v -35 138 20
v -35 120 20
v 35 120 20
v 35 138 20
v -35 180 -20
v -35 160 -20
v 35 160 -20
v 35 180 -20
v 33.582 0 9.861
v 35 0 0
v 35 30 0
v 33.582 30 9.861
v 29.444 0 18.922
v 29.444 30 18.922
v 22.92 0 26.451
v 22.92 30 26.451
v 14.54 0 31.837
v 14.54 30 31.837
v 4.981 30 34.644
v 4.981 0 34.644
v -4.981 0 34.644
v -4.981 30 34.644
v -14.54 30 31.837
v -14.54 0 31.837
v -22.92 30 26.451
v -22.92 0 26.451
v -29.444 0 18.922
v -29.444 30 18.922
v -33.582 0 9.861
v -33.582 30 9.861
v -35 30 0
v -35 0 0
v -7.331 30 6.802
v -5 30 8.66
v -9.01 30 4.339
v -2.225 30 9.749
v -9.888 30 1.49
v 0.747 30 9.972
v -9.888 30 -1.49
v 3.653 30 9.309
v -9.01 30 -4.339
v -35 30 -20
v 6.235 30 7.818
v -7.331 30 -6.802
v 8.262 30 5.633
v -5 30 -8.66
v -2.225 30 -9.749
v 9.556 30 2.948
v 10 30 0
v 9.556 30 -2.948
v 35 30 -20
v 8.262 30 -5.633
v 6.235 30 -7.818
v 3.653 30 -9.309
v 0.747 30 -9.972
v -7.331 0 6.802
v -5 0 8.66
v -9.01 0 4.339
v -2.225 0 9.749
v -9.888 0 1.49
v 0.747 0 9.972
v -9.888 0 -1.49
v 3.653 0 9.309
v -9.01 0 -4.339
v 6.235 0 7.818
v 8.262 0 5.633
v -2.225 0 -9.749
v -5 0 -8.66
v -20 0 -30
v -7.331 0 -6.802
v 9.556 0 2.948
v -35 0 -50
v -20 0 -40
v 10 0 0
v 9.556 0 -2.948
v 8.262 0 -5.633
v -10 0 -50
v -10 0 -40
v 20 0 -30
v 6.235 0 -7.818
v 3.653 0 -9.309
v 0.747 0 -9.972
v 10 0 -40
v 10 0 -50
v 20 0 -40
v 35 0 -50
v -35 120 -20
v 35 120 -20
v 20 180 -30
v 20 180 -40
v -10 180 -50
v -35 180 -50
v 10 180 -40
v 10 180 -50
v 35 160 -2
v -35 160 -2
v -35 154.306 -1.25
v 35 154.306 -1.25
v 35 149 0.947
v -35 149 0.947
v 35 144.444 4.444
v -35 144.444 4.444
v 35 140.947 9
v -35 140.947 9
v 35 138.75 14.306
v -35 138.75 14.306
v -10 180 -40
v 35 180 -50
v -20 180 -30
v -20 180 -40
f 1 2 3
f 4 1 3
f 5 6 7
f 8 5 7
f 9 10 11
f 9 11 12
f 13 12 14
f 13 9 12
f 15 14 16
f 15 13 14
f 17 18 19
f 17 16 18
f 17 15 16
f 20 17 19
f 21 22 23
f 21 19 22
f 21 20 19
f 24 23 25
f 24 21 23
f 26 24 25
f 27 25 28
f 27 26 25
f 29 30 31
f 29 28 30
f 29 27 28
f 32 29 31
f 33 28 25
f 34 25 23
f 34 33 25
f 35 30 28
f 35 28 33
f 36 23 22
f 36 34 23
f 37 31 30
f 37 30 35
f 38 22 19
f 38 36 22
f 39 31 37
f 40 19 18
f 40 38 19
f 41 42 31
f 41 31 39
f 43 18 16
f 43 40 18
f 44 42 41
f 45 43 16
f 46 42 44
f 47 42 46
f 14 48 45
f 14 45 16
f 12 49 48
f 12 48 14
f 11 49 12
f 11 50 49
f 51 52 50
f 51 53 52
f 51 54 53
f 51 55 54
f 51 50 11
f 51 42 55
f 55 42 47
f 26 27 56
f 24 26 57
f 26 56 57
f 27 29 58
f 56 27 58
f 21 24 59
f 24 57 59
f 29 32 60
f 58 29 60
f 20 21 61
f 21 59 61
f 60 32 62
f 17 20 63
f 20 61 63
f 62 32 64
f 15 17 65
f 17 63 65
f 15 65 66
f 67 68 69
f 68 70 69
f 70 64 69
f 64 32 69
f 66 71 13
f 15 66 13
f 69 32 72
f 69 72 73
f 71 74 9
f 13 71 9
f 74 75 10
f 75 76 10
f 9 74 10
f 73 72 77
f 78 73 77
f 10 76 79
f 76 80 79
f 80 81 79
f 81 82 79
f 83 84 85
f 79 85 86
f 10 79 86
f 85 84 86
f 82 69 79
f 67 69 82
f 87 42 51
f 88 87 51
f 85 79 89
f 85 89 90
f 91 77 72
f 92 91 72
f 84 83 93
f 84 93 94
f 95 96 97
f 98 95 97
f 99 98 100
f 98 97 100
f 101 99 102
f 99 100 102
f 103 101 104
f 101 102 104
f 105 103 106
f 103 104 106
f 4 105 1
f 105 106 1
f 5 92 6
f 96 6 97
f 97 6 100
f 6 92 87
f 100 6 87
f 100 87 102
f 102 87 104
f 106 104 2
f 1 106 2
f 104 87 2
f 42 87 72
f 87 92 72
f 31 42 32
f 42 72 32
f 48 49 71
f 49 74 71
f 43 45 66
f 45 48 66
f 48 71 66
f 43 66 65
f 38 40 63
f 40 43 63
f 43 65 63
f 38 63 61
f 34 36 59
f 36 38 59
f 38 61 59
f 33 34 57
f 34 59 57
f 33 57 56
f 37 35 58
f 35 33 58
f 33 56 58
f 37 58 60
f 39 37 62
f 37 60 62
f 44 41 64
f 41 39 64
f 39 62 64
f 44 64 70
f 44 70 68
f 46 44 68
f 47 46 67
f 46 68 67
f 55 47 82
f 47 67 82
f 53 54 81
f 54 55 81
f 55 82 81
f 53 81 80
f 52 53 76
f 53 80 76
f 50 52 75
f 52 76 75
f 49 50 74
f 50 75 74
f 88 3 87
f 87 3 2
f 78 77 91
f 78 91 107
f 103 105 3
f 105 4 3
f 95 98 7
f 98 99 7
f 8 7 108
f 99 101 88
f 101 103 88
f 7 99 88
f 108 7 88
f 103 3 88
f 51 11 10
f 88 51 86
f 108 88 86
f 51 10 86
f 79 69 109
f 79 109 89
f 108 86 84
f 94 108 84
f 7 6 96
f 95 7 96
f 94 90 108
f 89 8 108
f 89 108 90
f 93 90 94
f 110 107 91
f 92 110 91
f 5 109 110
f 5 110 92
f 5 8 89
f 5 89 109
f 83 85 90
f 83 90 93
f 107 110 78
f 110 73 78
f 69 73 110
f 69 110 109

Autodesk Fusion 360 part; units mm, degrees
sketch "Sketch1" plane through (0, 0, 0) normal (0, 1, 0) x (1, 0, 0)
  circle A0 centre (0, 0) radius 10
  line L0 (-35, 0) -> (-35, 50)
  line L1 (35, 50) -> (35, 0)
  arc A1 (-35, 0) -> (35, 0) centre (0, 0) ccw
  line L2 (-10, 50) -> (-10, 40)
  line L3 (-20, 40) -> (-10, 40)
  line L4 (-20, 40) -> (-20, 30)
  line L5 (20, 30) -> (20, 40)
  line L6 (20, 40) -> (10, 40)
  line L7 (10, 40) -> (10, 50)
  line L8 (-20, 30) -> (-18.0278, 30)
  line L9 (18.0278, 30) -> (20, 30)
  line L10 (-18.0278, 30) -> (18.0278, 30)
  line L11 (-35, 50) -> (-10, 50)
  line L12 (10, 50) -> (35, 50)
  dimension "d1" = 70
  dimension "d2" = 50
  dimension "d3" = 70
  dimension "d4" = 90
  dimension "d5" = 90
extrude "Extrude1" add sketch "Sketch1" along normal blind 30
sketch "Sketch2" plane through (0, 30, 0) normal (0, 1, 0) x (-1, 0, 0)
  circle A0 centre (0, 0) radius 10
  line L0 (20, -40) -> (10, -40)
  line L1 (10, -40) -> (10, -50)
  line L2 (10, -50) -> (35, -50)
  line L3 (35, -50) -> (35, 0)
  arc A1 (35, 0) -> (-35, 0) centre (0, 0) ccw
  line L4 (-35, 0) -> (-35, -50)
  line L5 (-35, -50) -> (-10, -50)
  line L6 (-10, -50) -> (-10, -40)
  line L7 (-10, -40) -> (-20, -40)
  line L8 (-20, -40) -> (-20, -30)
  line L9 (-20, -30) -> (20, -30)
  line L10 (20, -30) -> (20, -40)
  line L11 (-35, -50) -> (35, -50)
  line L12 (35, -50) -> (35, -20)
  line L13 (35, -20) -> (-35, -20)
  line L14 (-35, -20) -> (-35, -50)
extrude "Extrude2" add sketch "Sketch2" along normal blind 90 contours L0 L1 L2 L3 L4 L5 L6 L7 L8 L9 L10 L11 L12 L13 L14 | L0 L1 L6 L7 L8 L9 L10 L11
sketch "Sketch3" plane through (0, 120, 0) normal (0, 1, 0) x (-1, 0, 0)
  line L0 (-35, -20) -> (-35, -50)
  line L1 (-35, -50) -> (35, -50)
  line L2 (35, -50) -> (35, -20)
  line L3 (35, -20) -> (-35, -20)
  line L4 (-35, -50) -> (35, -50)
  line L5 (35, -50) -> (35, 20)
  line L6 (35, 20) -> (-35, 20)
  line L7 (-35, 20) -> (-35, -50)
  dimension "d10" = 70
  dimension "d11" = 70
extrude "Extrude3" add sketch "Sketch3" along normal blind 18
sketch "Sketch4" plane through (-35, 0, 0) normal (-1, 0, 0) x (0, -1, 0)
  line L0 (0, -50) -> (0, 0)
  line L1 (0, 0) -> (-30, 0)
  line L2 (-30, 0) -> (-30, -20)
  line L3 (-30, -20) -> (-120, -20)
  line L4 (-120, -20) -> (-120, 20)
  line L5 (-120, 20) -> (-138, 20)
  line L6 (-138, 20) -> (-138, -50)
  line L7 (-138, -50) -> (0, -50)
  line L8 (-138, -50) -> (-160, -50)
  line L9 (-160, -50) -> (-160, -2)
  line L10 (-138, 20) -> (-138, -50)
  arc A0 (-160, -2) -> (-138, 20) centre (-160, 20) ccw
  dimension "d14" = 22
extrude "Extrude4" add sketch "Sketch4" against normal blind 70 contours L6 L8 L9 L10 A0
sketch "Sketch5" plane through (0, 160, 0) normal (0, 1, 0) x (-1, 0, 0)
  line L0 (35, -50) -> (35, -2)
  line L1 (35, -2) -> (-35, -2)
  line L2 (-35, -2) -> (-35, -50)
  line L3 (-35, -50) -> (35, -50)
  line L4 (-35, -50) -> (35, -50)
  line L5 (35, -50) -> (35, -20)
  line L6 (35, -20) -> (-35, -20)
  line L7 (-35, -20) -> (-35, -50)
  dimension "d17" = 30
extrude "Extrude5" add sketch "Sketch5" along normal blind 20 contours L0 L2 L3 L4 L5 L6 L7
sketch "Sketch6" plane through (0, 0, 0) normal (0, -1, 0) x (1, 0, 0)
  circle A0 centre (0, 0) radius 10
  line L0 (-10, -40) -> (-20, -40)
  line L1 (-20, -40) -> (-20, -30)
  line L2 (-20, -30) -> (20, -30)
  line L3 (20, -30) -> (20, -40)
  line L4 (20, -40) -> (10, -40)
  line L5 (10, -40) -> (10, -50)
  line L6 (10, -50) -> (35, -50)
  line L7 (35, -50) -> (35, 0)
  arc A1 (35, 0) -> (-35, 0) centre (0, 0) ccw
  line L8 (-35, 0) -> (-35, -50)
  line L9 (-35, -50) -> (-10, -50)
  line L10 (-10, -50) -> (-10, -40)
  line L11 (-10, -50) -> (-10, -40)
  line L12 (-10, -40) -> (-20, -40)
  line L13 (-20, -40) -> (-20, -30)
  line L14 (-20, -30) -> (20, -30)
  line L15 (20, -30) -> (20, -40)
  line L16 (20, -40) -> (10, -40)
  line L17 (10, -40) -> (10, -50)
  line L18 (-10, -50) -> (10, -50)
extrude "Extrude6" cut sketch "Sketch6" against normal blind 210 contours L0 L1 L2 L3 L4 L5 L10 L11 L12 L13 L14 L15 L16 L17 L18
